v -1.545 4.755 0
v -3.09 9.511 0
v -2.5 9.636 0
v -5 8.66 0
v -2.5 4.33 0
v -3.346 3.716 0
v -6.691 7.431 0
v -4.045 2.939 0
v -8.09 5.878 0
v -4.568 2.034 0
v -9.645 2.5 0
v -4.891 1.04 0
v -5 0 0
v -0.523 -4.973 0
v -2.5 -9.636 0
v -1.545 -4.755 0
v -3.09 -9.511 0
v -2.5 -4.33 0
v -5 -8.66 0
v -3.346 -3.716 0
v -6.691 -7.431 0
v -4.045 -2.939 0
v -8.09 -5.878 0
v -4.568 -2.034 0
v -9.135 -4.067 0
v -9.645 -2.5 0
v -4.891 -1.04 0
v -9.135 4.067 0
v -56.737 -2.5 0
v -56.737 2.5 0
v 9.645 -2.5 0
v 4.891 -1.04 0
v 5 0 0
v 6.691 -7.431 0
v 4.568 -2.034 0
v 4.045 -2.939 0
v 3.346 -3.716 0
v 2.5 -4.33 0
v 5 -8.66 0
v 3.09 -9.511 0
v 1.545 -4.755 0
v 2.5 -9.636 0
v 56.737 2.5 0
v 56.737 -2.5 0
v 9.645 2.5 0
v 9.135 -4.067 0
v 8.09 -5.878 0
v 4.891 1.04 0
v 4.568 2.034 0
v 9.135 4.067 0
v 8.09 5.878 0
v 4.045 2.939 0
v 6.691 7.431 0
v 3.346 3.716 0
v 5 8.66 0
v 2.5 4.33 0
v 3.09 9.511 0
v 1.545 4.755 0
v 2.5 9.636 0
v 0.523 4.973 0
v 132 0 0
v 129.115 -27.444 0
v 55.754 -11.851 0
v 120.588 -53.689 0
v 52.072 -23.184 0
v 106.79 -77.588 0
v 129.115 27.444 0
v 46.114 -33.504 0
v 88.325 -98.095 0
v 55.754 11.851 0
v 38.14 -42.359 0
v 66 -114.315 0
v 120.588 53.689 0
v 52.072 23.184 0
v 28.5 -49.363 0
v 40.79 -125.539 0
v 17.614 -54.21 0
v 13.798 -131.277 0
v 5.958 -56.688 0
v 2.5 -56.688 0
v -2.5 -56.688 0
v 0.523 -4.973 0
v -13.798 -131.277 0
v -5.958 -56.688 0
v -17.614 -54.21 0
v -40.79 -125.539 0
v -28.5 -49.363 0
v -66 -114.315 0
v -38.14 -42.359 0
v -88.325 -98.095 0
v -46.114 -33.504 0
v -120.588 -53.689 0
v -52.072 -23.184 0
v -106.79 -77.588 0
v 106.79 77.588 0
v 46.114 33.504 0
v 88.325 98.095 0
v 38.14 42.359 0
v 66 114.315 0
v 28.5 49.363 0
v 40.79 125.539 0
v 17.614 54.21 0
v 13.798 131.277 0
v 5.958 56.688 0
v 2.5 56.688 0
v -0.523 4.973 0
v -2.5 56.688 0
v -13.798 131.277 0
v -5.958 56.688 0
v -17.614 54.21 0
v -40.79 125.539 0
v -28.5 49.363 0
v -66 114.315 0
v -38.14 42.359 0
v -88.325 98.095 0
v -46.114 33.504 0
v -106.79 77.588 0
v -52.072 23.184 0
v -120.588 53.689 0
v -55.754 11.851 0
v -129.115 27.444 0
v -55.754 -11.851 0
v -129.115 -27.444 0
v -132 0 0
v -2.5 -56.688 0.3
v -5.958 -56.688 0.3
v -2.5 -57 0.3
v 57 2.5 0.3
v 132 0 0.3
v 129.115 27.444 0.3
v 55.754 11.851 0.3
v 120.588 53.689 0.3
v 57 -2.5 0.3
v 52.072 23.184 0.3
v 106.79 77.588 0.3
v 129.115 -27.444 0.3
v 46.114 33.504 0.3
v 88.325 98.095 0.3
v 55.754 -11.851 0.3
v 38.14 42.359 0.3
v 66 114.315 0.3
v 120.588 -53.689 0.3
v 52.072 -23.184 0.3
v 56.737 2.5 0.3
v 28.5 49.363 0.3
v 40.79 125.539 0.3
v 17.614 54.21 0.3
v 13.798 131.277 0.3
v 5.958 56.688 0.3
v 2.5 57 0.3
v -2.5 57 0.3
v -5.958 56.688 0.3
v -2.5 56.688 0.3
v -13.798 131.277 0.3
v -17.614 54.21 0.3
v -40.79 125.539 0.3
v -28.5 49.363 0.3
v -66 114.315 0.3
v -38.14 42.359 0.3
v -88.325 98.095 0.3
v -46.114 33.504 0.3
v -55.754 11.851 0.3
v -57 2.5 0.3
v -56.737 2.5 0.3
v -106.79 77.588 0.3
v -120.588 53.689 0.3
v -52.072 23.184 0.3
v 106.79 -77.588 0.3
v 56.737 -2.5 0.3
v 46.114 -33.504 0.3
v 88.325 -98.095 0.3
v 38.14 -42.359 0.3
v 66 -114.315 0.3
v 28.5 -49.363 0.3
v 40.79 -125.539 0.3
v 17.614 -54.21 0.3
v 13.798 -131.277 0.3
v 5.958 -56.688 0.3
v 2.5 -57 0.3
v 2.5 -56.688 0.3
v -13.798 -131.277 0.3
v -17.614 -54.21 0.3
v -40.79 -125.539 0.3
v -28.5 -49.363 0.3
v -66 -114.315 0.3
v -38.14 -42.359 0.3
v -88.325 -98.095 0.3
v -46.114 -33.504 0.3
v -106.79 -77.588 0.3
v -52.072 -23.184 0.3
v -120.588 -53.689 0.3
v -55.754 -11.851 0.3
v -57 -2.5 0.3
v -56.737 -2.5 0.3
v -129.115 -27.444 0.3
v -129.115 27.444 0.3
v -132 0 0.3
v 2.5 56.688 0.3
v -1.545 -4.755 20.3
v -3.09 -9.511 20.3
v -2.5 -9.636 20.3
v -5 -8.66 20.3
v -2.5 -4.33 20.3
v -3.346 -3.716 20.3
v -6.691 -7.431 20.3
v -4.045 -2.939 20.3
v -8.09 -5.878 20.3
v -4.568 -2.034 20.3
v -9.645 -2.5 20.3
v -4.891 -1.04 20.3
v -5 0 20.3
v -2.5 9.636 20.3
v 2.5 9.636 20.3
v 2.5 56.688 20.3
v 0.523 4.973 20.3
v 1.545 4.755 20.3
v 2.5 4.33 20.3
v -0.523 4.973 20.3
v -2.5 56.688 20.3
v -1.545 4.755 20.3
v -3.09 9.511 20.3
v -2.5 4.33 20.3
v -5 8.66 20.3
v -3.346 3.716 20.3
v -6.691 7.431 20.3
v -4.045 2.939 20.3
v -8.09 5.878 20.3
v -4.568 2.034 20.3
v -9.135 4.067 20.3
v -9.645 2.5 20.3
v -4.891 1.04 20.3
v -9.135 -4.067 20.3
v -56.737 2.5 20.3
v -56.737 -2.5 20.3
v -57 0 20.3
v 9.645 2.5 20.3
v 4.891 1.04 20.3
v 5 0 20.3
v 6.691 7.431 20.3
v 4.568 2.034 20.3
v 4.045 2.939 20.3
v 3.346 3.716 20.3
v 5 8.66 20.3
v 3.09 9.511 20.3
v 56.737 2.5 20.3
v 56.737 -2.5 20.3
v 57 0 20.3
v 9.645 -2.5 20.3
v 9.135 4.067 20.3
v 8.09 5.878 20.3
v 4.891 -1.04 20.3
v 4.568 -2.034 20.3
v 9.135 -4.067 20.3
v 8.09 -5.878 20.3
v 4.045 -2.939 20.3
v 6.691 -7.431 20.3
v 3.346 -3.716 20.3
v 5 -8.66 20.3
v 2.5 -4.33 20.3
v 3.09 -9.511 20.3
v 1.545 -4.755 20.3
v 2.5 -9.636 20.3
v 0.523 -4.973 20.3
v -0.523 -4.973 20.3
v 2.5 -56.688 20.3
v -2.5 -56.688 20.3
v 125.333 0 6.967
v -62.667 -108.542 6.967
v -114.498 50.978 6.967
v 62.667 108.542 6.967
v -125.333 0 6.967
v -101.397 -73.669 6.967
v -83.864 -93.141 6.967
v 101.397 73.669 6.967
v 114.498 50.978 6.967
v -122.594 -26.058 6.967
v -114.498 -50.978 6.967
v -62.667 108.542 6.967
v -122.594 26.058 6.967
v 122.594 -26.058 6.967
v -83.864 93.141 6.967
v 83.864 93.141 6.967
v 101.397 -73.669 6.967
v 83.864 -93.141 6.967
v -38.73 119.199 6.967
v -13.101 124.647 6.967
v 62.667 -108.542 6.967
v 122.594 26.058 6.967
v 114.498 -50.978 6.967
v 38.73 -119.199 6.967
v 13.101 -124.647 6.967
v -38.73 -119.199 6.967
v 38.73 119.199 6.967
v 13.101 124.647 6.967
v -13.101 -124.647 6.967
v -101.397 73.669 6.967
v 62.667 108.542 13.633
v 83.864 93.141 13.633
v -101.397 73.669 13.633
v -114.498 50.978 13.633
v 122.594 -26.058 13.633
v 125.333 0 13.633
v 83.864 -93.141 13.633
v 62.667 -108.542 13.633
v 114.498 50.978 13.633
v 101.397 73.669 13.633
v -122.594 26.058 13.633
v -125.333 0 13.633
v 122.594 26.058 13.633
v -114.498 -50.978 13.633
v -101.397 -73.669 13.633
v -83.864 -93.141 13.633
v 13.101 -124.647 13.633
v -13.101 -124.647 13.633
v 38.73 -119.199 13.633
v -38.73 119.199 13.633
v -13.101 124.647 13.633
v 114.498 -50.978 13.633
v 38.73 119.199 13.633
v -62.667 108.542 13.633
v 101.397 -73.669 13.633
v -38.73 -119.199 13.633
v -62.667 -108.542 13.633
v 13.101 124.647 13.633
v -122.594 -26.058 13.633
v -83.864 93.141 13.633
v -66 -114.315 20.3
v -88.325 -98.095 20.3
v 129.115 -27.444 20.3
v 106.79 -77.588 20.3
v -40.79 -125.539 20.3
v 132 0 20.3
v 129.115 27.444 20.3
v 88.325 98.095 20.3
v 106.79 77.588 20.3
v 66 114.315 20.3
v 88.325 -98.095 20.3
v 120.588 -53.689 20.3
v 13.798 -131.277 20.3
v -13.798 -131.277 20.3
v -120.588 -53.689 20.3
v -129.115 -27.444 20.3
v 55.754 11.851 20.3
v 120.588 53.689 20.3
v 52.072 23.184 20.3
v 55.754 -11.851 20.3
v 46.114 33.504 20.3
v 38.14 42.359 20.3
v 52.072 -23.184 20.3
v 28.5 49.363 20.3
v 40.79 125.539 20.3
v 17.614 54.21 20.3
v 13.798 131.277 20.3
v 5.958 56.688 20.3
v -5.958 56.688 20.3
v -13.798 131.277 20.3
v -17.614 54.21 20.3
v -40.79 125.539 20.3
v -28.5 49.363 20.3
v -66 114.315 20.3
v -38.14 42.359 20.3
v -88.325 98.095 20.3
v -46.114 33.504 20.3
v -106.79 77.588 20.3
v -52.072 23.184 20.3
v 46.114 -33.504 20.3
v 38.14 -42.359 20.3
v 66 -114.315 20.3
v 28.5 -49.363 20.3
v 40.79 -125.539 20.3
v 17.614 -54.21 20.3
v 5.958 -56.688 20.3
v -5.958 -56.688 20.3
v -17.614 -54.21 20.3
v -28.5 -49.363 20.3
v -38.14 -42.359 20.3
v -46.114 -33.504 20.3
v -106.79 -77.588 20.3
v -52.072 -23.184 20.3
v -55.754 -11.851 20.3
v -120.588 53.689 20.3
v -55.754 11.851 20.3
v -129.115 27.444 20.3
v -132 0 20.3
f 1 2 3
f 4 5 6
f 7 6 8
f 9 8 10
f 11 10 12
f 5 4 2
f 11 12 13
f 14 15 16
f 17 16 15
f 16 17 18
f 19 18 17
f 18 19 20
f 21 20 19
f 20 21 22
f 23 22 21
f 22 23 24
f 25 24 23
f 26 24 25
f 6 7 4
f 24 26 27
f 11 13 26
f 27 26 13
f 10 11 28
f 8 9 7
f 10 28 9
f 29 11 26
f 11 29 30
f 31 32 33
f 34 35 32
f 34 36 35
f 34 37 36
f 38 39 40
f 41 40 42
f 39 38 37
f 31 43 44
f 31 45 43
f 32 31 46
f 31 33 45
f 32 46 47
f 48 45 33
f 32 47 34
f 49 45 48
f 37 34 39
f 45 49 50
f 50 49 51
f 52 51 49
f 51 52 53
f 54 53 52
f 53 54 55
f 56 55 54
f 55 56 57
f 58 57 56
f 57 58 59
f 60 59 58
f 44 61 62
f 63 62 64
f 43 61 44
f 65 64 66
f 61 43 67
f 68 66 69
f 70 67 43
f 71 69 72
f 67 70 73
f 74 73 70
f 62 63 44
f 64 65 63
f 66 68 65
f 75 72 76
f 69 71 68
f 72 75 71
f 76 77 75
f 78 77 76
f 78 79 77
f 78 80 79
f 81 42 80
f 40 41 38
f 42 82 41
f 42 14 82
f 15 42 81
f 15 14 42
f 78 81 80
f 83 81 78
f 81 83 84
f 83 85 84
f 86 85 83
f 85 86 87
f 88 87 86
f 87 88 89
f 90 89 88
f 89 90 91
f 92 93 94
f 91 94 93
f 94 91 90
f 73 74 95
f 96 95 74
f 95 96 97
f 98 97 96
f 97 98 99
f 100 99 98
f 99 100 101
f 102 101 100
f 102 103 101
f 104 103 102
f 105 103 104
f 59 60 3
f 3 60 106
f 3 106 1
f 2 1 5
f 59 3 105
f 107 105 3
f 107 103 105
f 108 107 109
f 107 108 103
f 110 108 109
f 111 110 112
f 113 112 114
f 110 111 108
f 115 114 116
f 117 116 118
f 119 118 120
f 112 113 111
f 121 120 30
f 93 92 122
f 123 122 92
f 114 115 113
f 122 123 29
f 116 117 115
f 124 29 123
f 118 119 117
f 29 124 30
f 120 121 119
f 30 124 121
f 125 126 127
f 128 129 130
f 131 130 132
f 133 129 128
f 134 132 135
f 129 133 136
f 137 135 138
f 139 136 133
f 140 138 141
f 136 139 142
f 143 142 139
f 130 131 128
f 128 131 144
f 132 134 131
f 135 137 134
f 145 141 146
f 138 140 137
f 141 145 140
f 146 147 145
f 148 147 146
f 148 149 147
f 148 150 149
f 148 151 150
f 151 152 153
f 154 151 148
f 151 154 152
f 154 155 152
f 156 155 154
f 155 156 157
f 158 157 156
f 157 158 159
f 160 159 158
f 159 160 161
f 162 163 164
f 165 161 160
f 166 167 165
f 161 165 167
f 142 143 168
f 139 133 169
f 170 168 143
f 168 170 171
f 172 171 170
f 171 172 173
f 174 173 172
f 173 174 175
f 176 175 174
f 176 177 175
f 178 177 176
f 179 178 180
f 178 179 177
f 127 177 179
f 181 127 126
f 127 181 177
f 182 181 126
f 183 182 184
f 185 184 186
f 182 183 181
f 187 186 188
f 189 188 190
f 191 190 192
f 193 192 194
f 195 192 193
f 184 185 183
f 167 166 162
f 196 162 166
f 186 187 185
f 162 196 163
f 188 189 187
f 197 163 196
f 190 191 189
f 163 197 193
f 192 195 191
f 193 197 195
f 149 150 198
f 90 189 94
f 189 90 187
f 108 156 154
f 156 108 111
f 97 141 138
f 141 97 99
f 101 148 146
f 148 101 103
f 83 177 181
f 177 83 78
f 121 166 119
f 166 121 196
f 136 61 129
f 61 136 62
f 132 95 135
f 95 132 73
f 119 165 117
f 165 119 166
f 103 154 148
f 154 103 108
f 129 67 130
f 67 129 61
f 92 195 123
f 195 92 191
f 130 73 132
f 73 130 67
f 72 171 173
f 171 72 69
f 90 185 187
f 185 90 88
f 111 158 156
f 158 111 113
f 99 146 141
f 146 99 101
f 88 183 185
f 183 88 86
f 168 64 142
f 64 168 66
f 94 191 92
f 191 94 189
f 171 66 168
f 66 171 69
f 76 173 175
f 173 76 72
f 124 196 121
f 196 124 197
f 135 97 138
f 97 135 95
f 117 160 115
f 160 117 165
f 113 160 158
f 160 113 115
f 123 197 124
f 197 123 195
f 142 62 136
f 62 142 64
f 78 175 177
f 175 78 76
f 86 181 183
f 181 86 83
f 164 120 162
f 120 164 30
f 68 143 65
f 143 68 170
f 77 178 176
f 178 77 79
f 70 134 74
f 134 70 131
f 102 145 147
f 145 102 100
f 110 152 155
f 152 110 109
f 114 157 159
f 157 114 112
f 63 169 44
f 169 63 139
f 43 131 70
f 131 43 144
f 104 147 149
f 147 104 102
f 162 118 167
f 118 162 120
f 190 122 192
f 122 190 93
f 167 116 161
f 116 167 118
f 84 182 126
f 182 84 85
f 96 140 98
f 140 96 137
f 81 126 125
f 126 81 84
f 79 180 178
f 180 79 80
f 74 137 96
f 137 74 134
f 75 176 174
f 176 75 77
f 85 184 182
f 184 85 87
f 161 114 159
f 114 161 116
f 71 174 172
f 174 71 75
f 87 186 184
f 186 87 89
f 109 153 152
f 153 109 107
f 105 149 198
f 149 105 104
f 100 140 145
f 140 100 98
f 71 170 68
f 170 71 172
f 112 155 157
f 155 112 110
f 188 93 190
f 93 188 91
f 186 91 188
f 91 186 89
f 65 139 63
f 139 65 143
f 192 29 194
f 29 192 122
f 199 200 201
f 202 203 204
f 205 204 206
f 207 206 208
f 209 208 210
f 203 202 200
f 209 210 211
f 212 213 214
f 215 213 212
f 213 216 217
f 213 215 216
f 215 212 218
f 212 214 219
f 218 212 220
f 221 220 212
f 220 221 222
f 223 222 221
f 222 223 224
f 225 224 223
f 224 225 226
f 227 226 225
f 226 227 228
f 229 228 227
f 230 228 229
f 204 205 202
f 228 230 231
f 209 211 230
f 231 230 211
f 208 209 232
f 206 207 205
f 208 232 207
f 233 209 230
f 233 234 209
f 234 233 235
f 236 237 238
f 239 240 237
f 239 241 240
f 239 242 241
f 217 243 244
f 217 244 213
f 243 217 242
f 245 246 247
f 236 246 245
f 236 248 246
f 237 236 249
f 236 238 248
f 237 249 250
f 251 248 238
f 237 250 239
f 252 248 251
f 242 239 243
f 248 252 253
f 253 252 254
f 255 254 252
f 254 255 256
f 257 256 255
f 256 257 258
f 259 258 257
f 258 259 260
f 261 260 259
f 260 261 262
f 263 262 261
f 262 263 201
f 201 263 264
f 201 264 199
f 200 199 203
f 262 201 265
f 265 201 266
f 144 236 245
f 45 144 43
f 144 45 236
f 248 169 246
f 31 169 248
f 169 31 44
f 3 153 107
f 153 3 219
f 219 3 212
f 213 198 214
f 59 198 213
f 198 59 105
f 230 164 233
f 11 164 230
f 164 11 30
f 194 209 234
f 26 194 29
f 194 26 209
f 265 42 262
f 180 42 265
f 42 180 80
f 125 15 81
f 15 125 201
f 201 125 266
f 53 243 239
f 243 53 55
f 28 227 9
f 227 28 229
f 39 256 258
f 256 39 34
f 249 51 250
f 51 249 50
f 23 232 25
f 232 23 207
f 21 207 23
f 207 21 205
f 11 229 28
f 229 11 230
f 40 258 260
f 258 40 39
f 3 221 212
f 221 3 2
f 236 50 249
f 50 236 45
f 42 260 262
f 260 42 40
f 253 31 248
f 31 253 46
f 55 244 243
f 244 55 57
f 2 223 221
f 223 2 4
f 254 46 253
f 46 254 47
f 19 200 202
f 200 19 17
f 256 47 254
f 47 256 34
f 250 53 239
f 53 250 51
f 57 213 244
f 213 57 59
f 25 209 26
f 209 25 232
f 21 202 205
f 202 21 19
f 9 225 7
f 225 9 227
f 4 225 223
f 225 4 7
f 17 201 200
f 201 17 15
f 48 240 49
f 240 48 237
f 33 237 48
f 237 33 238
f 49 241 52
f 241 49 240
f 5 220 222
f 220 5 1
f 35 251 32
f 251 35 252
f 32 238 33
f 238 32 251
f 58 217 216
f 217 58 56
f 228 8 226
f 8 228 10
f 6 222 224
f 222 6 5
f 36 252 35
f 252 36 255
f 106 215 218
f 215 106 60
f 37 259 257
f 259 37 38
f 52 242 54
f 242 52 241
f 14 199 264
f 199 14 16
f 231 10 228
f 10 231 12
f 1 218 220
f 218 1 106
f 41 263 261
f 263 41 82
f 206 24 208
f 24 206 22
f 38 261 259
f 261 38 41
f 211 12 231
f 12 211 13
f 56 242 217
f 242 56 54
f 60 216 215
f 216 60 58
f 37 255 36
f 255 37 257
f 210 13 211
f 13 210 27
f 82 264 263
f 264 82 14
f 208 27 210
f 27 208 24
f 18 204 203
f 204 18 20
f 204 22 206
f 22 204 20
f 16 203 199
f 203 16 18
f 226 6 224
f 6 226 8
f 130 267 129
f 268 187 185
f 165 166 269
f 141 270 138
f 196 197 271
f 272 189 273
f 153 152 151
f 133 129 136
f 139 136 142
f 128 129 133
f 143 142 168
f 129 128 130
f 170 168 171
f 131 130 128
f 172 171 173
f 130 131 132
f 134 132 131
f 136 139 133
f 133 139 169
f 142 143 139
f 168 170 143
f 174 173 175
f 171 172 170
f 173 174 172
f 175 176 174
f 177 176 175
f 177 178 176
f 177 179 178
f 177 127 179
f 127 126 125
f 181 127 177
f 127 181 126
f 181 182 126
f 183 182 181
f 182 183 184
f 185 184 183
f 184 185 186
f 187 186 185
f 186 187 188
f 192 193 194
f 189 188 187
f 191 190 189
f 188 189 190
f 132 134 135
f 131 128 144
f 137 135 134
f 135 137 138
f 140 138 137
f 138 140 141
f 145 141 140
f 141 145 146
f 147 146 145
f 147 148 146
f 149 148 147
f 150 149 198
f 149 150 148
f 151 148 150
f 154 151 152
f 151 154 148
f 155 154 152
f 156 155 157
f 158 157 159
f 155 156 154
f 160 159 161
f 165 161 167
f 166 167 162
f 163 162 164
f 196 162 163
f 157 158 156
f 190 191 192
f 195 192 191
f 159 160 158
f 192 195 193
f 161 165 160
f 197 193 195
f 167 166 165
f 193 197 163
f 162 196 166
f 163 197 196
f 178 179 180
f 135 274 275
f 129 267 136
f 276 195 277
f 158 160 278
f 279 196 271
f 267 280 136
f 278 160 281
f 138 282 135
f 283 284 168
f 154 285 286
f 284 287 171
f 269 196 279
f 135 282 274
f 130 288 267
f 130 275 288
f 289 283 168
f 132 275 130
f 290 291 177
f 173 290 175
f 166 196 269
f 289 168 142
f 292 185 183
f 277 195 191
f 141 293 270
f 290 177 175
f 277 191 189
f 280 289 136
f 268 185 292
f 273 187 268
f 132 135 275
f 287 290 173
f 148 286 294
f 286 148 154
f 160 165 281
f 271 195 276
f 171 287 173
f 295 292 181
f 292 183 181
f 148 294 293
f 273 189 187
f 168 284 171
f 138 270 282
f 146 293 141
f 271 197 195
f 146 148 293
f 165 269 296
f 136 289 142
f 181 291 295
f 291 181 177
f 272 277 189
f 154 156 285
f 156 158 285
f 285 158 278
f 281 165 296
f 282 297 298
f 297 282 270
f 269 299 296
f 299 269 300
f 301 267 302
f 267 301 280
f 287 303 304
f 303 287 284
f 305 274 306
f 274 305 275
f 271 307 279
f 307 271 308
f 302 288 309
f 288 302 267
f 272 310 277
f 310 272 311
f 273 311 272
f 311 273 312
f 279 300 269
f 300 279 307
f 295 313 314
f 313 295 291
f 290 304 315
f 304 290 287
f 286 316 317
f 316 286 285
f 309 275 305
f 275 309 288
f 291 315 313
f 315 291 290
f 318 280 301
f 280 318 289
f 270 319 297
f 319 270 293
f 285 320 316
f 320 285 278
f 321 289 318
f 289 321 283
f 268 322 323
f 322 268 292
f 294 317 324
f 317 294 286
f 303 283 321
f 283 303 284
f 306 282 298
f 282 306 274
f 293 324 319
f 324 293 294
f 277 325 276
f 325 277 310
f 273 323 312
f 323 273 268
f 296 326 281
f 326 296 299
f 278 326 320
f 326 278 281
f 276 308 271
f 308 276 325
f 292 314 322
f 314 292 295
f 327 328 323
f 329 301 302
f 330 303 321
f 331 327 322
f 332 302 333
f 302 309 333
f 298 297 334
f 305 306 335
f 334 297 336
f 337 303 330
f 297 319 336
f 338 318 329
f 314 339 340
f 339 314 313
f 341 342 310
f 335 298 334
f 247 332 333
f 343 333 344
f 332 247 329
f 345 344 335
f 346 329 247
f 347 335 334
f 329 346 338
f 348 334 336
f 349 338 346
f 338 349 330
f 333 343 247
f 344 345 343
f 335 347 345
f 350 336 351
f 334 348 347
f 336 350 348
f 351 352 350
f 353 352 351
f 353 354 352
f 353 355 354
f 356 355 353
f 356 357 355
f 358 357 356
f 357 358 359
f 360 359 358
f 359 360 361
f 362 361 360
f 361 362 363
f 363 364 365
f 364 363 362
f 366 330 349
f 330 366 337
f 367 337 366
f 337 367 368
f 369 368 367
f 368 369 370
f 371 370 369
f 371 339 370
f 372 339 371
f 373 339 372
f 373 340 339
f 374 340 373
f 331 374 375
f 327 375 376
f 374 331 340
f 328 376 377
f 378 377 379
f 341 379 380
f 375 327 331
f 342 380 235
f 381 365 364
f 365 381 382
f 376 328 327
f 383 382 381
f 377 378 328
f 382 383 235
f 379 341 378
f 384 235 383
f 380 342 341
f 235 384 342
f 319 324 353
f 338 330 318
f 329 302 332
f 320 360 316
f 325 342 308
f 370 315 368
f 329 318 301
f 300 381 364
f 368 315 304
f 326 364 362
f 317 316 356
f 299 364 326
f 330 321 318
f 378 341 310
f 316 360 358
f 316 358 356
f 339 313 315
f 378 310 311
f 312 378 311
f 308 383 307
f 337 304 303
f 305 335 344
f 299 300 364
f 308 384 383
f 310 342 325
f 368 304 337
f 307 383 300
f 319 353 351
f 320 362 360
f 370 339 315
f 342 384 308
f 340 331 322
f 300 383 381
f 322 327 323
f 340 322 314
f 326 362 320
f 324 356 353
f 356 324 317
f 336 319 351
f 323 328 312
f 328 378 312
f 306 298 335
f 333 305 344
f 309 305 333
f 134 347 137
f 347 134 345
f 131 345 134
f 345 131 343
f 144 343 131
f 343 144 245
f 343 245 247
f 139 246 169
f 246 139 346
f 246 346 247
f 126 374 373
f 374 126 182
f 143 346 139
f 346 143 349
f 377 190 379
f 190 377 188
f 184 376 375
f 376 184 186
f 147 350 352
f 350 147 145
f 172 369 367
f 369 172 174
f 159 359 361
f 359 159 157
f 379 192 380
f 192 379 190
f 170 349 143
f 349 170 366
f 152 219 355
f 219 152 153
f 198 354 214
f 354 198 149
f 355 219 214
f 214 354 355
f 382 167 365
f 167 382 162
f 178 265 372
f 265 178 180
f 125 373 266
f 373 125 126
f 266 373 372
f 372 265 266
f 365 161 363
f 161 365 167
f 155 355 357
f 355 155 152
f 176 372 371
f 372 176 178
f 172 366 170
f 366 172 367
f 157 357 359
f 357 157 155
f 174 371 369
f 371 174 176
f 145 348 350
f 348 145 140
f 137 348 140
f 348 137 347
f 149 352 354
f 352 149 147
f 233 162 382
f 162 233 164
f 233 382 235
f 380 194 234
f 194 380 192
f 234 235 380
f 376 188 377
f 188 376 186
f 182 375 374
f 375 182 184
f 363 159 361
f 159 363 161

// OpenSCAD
/* 
This is an OpenSCAD library to create various pinion wheels, escapements and other pieces of clockwork gearing
Uses the MCAD involute_gears library and will not work without it!
Created by syvwlch and licensed under the Attribution - Share Alike - Creative Commons license.

v1 - 2011 04 15	
First library version of the code

v2 - 2011 04 21	
Added spokes() module, and used it in escapement() module
Updated escapement(), ringtooth(), tooth() and ring() modules to render better in openCSG mode

v3 - 2011 04 22
Renamed to clockworkLibrary
Added hand(), handNotch(), pinionWheel(), pinionEscapementWheel(), pinionDrum()

v4 - 2011 04 29
Added negative space toggle to the parts, with a default value of false

v5 - 2011 05 01
Added herringbone gear option, with a default value of 0
Strengthened pinion teeth.

v6 - 2011 05 04 
Changed how drum height in pinionDrum() is measured to work like sleeve extension does, to simplify placement math
Corrected error in how sleeve extension is measured in pinionWheel() (wheels are 2*thickness+1*spacer thick)
Changed how drum height in pinionEscapementWheel() is measured, to standardize
Create a drum() module, and implemeted flanges to keep the string from falling off
Retrofitted drum() into pinionDrum(), as well as for the spacer in pinionEscapementWheel() and pinionWheel()

v7 - 2011 05 04 
Added an assymetric spacer so that the herringbone gears would mesh without running into the drum flanges
Switched to using mirror() to implement the two halves of the herringbone as a result

v8 - 2011 05 06
Fixed a bug in spokes() which referenced the wrong spoke width parameter (thanks kitlaan!)

v9 - 2011 05 07
Modified the escapement wheel profile to support club teeth (still defaults to ratchet teeth)
Club tooth parameters accessible in tooth(), ringtooth(), escapementWheel() and pinionEscapementWheel()
Modified escapement to control angle of impulse faces on the pallets, defaults to 45o as per ideal Graham escapement w/o club teeth
Escapement will work if impulse face angles are set to 45o minus tooth lean plus club angle, and drop can be controlled via face angle

v10 - 2011 05 08
Modified the drum() module to add holes to attach a string
Backwards compatible with no holes if the new arguments are not passed
Modified pinionDrum() to make use of this new feature, but backwards compatible with no holes if the new arguments are not passed

v11 - 2011 05 18
Modified to support the ratcheting drum designed by rustedrobot: http://www.thingiverse.com/thing:8555
Backwards compatible, one-piece drum still available as an option

v12 - 2012 02 06
Modified after Clockathon #1 and #2
PinionDrum deprecated, invoke pinionWheel instead, with number of teeth for the pinion gear set to zero.


It includes the following modules:
 
module ring(outerRadius,innerRadius,thickness,outerSegment=30,innerSegment=30)
	creates a hollow cylinder centered at origin
		outerRadius and innerRadius should be self-explanatory
		thickess is along z
		outerSegment is an optional override of the system variable $fn
		innerSegment is an optional override of the system variable $fn

module spokes(number_spokes,spoke_length,spoke_thickness,spoke_width,bore_radius,spoke_rotate=0) 
	creates spokes for a ring
		number_spokes controls the number of spokes
		spoke_length controls the length of the spokes, measured radialy from the center
		spoke_thickness controls the thickness of the spokes, measured along z
		spoke_width controls the width of the spokes, at right angles to length and thickness
		bore_radius controls the radius of the hole at the center
		spoke_rotate allows to rotate the whole set of spokes by some value

module tooth(toothLength,thickness,toothLean,toothSharpness)
	creates a triangular tooth, sharp end at origin
		toothLength is measured along longest side
		thickess is along z
		toothLean measures how far the tooth leans over, in degrees
		toothSharpness measures how sharp the tooth is, in degrees

module ringTooth(outerRadius,innerRadius,thickness,numberTeeth,toothLength)
	creates a ring centered at origin with the child spaced regularly along the outside edge of the inner radius
		outerRadius and innerRadius should be self-explanatory
		thickess is along z 
		numberTeeth controls how many instances of the child are used
		toothlength is used to offset the teeth outward, if needed

module escapementWheel(radius,rimWidth,drumHeight,toothThickness,numberTeeth,toothLength,toothLean,toothSharpness,numberSpokes,spokeWidth,hubWidth,bore)
	creates an escapement wheel centered at origin that matches the escapement if the parameter values are the same
	the teeth can be given a smaller thickness than the wheel, creating a drum, e.g. for powering the escapement via a weight on a string
		radius is the outer radius measured from the tooth tips
		rimWidth is the width of the rim of the wheel, measured radially
		drumHeight is the height of the drum along z
		toothThickess is the thickness of the teeth along z
		numberTeeth controls how many teeth the wheel has
		toothLength is the length of each tooth, 
		toothLean measures how far the tooth leans over clockwise, in degrees
		toothSharpness measures how sharp the tooth is, in degrees
		numberSpokes controls the number of spokes of the wheel
		spokeWidth controls the width of the spokes of the wheel
		hubWidth controls the width of the hub
		bore controls the size of the bore in the hub

module escapement(radius,thickness,faceAngle,armAngle,armWidth,numberTeeth,toothSpan,hubWidth,hubHeight,bore)
	creates a Graham escapement that matches the escapement wheel if the parameter values are the same 
	the escapement is centered at the origin and mirrored around the y axis
	for proper meshing, it must be translated by 2*radius*cos(180/numberTeeth*toothSpan) along the y axis
		radius is the radius of the wheel, not of the escapement
		thickess is along z
		faceAngle controls how many degrees the impulse face covers seen from the hub of the escapement wheel
		armAngle controls the angle of the escapement's arms, 0= no bend
		armWidth controls the width of the arms
		numberTeeth is the number of teeth of the wheel
		toothSpan is how many teeth the escapement spans 
		hubWidth controls the width of the hub
		hubHeight controls the height of the hub along z
		bore controls the size of the bore in the hub

module placeEscapement (angle,radius,numberTeeth,toothSpan)
	places the child (e.g. an instance of the escapement module) in a position to mesh properly with a matching wheel at origin
	also rotates the escapement around the wheel, if needed
		angle is the angle the escapement is rotated around the wheel
		radius is the radius of the escapement wheel (from the tooth tips)
		numberTeeth is the number of teeth in the wheel
		toothSpan is the number of teeth the escapement spans

module hand(hand_length,hand_width,hand_thickness,sleeve_level,pin_radius,sleeve_thickness,loose_fit,tight_fit,negative_space=false) 

module handNotch(notch_height,notch_width,sleeve_level,pin_radius,sleeve_thickness,notch_angle=0,negative_space=false)

module pinionWheel (large_gear_teeth,large_gear_circular_pitch,small_gear_teeth,small_gear_circular_pitch,gear_clearance,gear_backlash,pressure_angle,rim_width,sleeve_level,pin_radius,sleeve_thickness,loose_fit,gear_thickness,sleeve_extension,spacer,spoke_width,notch_angle=0,negative_space=false)

module pinionEscapementWheel (radius,escapement_teeth,tooth_length,tooth_lean,tooth_sharpness,small_gear_teeth,small_gear_circular_pitch,gear_clearance,gear_backlash,pressure_angle,rim_width,sleeve_level,pin_radius,sleeve_thickness,loose_fit,gear_thickness,sleeve_extension,spacer,spoke_width,notch_angle=0,negative_space=false)

module pinionDrum (drum_height,number_spokes,large_gear_teeth,large_gear_circular_pitch,gear_clearance,gear_backlash,pressure_angle,rim_width,sleeve_level,pin_radius,sleeve_thickness,loose_fit,gear_thickness,sleeve_extension,spacer,spoke_width,notch_angle=0,negative_space=false)

*/

/* test 

*/

escapementWheel(
	radius=66,
	rimWidth=75,
	drumHeight=20,
	toothThickness=.3,
	numberTeeth=30,
	toothLength=9,
	toothLean=30,
	toothSharpness=5,
	numberSpokes=4,
	spokeWidth=5,
	hubWidth=10,
	bore=5,
	clubSize=.2,
	clubAngle=30);

// End test 

module ring(
	outerRadius,
	innerRadius,
	thickness,
	outerSegment=30,
	innerSegment=30)
{
	difference() // hollows out the center of one cylinder with another, smaller one
	{
		cylinder(thickness,outerRadius,outerRadius,$fn=outerSegment);
		translate([0,0,-1])
		cylinder(thickness+2,innerRadius,innerRadius,,$fn=innerSegment);
	}
}

module spokes(
	number_spokes,
	spoke_length,
	spoke_thickness,
	spoke_width,
	bore_radius,
	spoke_rotate=0) 
{
	for ( j=[0:number_spokes-1]) // adds the spokes
	{
		rotate(spoke_rotate+360/number_spokes*j,[0,0,1]) 
		translate([bore_radius,-spoke_width/2,0]) 
		cube([spoke_length-bore_radius,spoke_width,spoke_thickness]);
	}
}

module tooth(
	toothLength,
	thickness,
	toothLean,
	toothSharpness,
	clubSize=0,
	clubAngle=0)
{
	rotate(-toothLean,[0,0,1])
	rotate(180,[0,0,1])
	linear_extrude(height=thickness,center=false,twist=0)
	polygon(
		points=	[ 	
				[0,0],
				[clubSize*toothLength*cos(45+toothLean+clubAngle),-clubSize*toothLength*sin(45+toothLean+clubAngle)],
				[clubSize*toothLength*(0.2+cos(45+toothLean+clubAngle)),-clubSize*toothLength*sin(45+toothLean+clubAngle)],
				[clubSize*toothLength*0.5,-clubSize*toothLength*0.5],
				[toothLength,0],
				[toothLength*cos(toothSharpness),toothLength*sin(toothSharpness)]
				],
		paths=	[
				[0,1,2,3,4,5]
				] );
}

module ringTooth(
	outerRadius,
	innerRadius,
	thickness,
	numberTeeth,
	toothLength)
{
	difference() // makes the center hollow while shaving off any parts of the teeth which might otherwise extend into the center
	 {
		union() // unites the teeth and the ring
		{
			cylinder(thickness,outerRadius,outerRadius,$fn=30);
			for ( i=[0:numberTeeth])
			{
				rotate(i*360/numberTeeth,[0,0,1])
				translate([innerRadius+toothLength,0,0]) 
				children(0);
			}
		}

		translate([0,0,-1])
		cylinder(thickness+2,innerRadius,innerRadius,$fn=30);
	}
}

module drum(
	radius,
	rimWidth,
	drumHeight,
	numberHoles=0,
	holeRadius=0,
	holeRotate=0)
{
	flangeWidth=min(drumHeight/3,rimWidth/2);

	difference()		// makes the center hollow & includes holes to attach string
	 {
		union() 	// builds the drum with flanges
		{
			cylinder(flangeWidth,radius,radius-flangeWidth,$fn=30);
	
			translate([0,0,flangeWidth])
			cylinder(drumHeight-2*flangeWidth,radius-flangeWidth,radius-flangeWidth);
	
			translate([0,0,drumHeight-flangeWidth])
			cylinder(flangeWidth,radius-flangeWidth,radius,$fn=30);
		}

		translate([0,0,-1])
		cylinder(drumHeight+2,radius-rimWidth,radius-rimWidth,$fn=30);

        if( numberHoles > 0 ) 
        {
            for ( j=[0:numberHoles-1]) // adds the holes
            {
                translate([0,0,drumHeight/2])
                rotate(holeRotate+360/numberHoles*j,[0,0,1]) 
                rotate(90,[0,1,0])
                cylinder(r=holeRadius,h=radius+1);
            }

        }
    }
}

module escapementWheel(
	radius,
	rimWidth,
	drumHeight,
	toothThickness,
	numberTeeth,
	toothLength,
	toothLean,
	toothSharpness,
	numberSpokes,
	spokeWidth,
	hubWidth,
	bore,
	clubSize=0,
	clubAngle=0)
{
	flangeWidth=min(drumHeight/3,rimWidth/2);

	union() // unites the wheel, the spokes and the hub
		{
		ringTooth(radius-toothLength+rimWidth,radius-toothLength,toothThickness,numberTeeth,toothLength)
		tooth(toothLength,toothThickness,toothLean,toothSharpness,clubSize,clubAngle);

		spokes(numberSpokes,radius-toothLength,drumHeight+toothThickness,spokeWidth,bore,0);

		ring(hubWidth,bore,toothThickness+drumHeight);

		ring(radius-toothLength+rimWidth,radius-toothLength,toothThickness);

		translate([0,0,toothThickness])
		drum(radius-toothLength+rimWidth,rimWidth,drumHeight);
	}
}

module escapement(
	radius,
	thickness,
	faceAngle,
	armAngle,
	armWidth,
	numberTeeth,
	toothSpan,
	hubWidth,
	hubHeight,
	bore,
	negative_space=false,
	space=0.1,
	max_swing=6,
	entryPalletAngle=45,
	exitPalletAngle=45)
{
	faceWidth=2*3.1415*radius*faceAngle/360; // calculate once
	escapementAngle=180/numberTeeth*toothSpan; // calculate once
	
	rotate(90,[0,0,1]) // rotates escapement so pendulum is along y axis
	
	if (negative_space==false)
	{
		union()
		{
			// this is the hub
			ring(hubWidth,bore,hubHeight);
			
			// this is the exit pallet

		// this is the arm of the pallet
			rotate(-90-armAngle,[0,0,1]) 
			translate([bore,-armWidth/2,0]) 
			cube([radius+faceWidth/2-bore,armWidth,thickness]);
			
			// this is the pallet itself
			intersection()
			{
				// this is the ring from which the "dead" faces are made
				// it is important that the arcs be smooth, i.e. $fn high
				// otherwise, there would be some recoil
				ring(radius+faceWidth/2,radius-faceWidth/2,thickness,180,180);
				
				// this is the cube which cuts the pallet where it meets the arm
				rotate(-90-armAngle,[0,0,1])
				translate([radius,0,0])
				rotate(180,[0,0,1]) 
				translate([-0.5*radius,0,-radius])
				cube(2.1*radius);
				
				// this is the cube which cuts the pallet at the impulse face
				translate([-2*radius*cos(escapementAngle),0,0])
				rotate(-escapementAngle,[0,0,1])
				rotate(0,[0,0,1])
				translate([radius,0,0])
				rotate(-90-exitPalletAngle,[0,0,1]) 
				translate([-0.5*radius,0,-radius])
				cube(2.2*radius);
			}

		// this is the entry  pallet

			// this is the arm of the pallet
			rotate(90+armAngle,[0,0,1]) 
			translate([bore,-armWidth/2,0]) 
			cube([radius+faceWidth/2-bore,armWidth,thickness]);
			
			// this is the pallet itself
			intersection()
			{
				// this is the ring from which the "dead" faces are made
				// it is important that the arcs be smooth, i.e. $fn high
				// otherwise, there would be some recoil
				ring(radius+faceWidth/2,radius-faceWidth/2,thickness,180,180);
				
				// this is the cube which cuts the pallet where it meets the arm
				rotate(90+armAngle,[0,0,1])
				translate([radius,0,0])
				rotate(0,[0,0,1]) 
				translate([-0.5*radius,0,-radius])
				cube(2.1*radius);
				
				// this is the cube which cuts the pallet at the impulse face
				translate([-2*radius*cos(escapementAngle),0,0])
				rotate(-escapementAngle,[0,0,1])
				rotate(2*escapementAngle,[0,0,1])
				translate([radius,0,0])
				rotate(-90-entryPalletAngle,[0,0,1]) 
				translate([-0.5*radius,0,-radius])
				cube(2.2*radius);
			}
		}
	}

	if (negative_space==true)
	{
		translate([0,0,-space])
		union()
		{
			ring(hubWidth+space,0,hubHeight+2*space);

			difference()
			{
				ring(radius+faceWidth/2+space,0,thickness+2*space);

				rotate(max_swing-armAngle,[0,0,1])
				translate([-radius,armWidth/2,-1])
				cube(2*radius+faceWidth+2*space);

				mirror([1,0,0])
				rotate(max_swing-armAngle,[0,0,1])
				translate([-radius,armWidth/2,-1])
				cube(2*radius+faceWidth+2*space);
			}
		}
	}
}

module placeEscapement (
	angle,
	radius,
	numberTeeth,
	toothSpan)
{
	rotate(angle,[0,0,1])
	translate([0,2*radius*cos(180/numberTeeth*toothSpan),0])
	children(0);
}

module hand(
	hand_length,
	hand_width,
	hand_thickness,
	sleeve_level,
	pin_radius,
	sleeve_thickness,
	loose_fit,
	tight_fit,
	negative_space=false,
	space=0.1) 
{
	bore_radius=pin_radius+sleeve_level*sleeve_thickness;
	sleeve_radius=pin_radius+(sleeve_level+1)*sleeve_thickness;
	
	if (negative_space==false)
	{
		union()
		{
			intersection()
			{
				for ( i=[1:2])
				{
					rotate(i*360/3,[0,0,1])
					translate([bore_radius+loose_fit,-hand_width/2,0])
					cube([sleeve_radius-bore_radius-loose_fit+sleeve_thickness,hand_width,hand_thickness]);
				}
				
				translate(-1,[0,0,1])
				cylinder(hand_thickness+2,sleeve_radius+sleeve_thickness,sleeve_radius+sleeve_thickness);
			}
			
			translate([bore_radius+loose_fit,-hand_width/2,0])
			cube([hand_length-bore_radius-loose_fit,hand_width,hand_thickness]);

			ring(sleeve_radius+sleeve_thickness,bore_radius+tight_fit+sleeve_thickness,hand_thickness);
		}
	}

	if (negative_space==true)
	{
		translate([0,0,-space])
		ring(sqrt(hand_length*hand_length+hand_width*hand_width)+space,0,hand_thickness+2*space);
	}
}

module handNotch(
	notch_height,
	notch_width,
	sleeve_level,
	pin_radius,
	sleeve_thickness,
	notch_angle=0,
	negative_space=false) 
{
	//bore_radius=pin_radius+sleeve_level*sleeve_thickness;
	sleeve_radius=pin_radius+(sleeve_level+1)*sleeve_thickness;
	
	if (negative_space==false)
	{
		if (notch_width!=0)
		{
			difference()
			{
				children(0);
				
				for ( i=[0:2])
				{
					rotate(notch_angle+i*360/3,[0,0,1])
					translate([0,-notch_width/2,notch_height])
					cube([sleeve_radius+1,notch_width,notch_height+1]);
				}
			}
		}

		if (notch_width==0)
		{
			children(0);
		}
	}

	if (negative_space==true)
	{
		children(0);
	}
}

module pinionWheel(
	large_gear_teeth,
	large_gear_circular_pitch,
	small_gear_teeth=0,
	small_gear_circular_pitch=0,
	gear_clearance=0.2,
	gear_backlash=0.1,
	gear_spacer=0.5,
	pressure_angle=14.5,
	twist_factor=0,
	rim_width,
	sleeve_level=0,
	pin_radius,
	sleeve_thickness,
	loose_fit=0.5,
	gear_thickness,
	sleeve_extension,
	spacer,
	number_spokes=5,
	spoke_width,
	notch_angle=0,
	negative_space=false,
	space=0.1) 
{
	large_dedendum_radius=large_gear_circular_pitch*(large_gear_teeth-2)/360-gear_clearance;
	small_dedendum_radius=small_gear_circular_pitch*(small_gear_teeth-2)/360-gear_clearance;
	
	large_addendum_radius=large_gear_circular_pitch*(large_gear_teeth+2)/360-gear_clearance;
	small_addendum_radius=small_gear_circular_pitch*(small_gear_teeth+2)/360-gear_clearance;
	
	bore_radius=pin_radius+sleeve_level*sleeve_thickness+loose_fit;
	sleeve_radius=pin_radius+(sleeve_level+1)*sleeve_thickness;

	small_gear_color = [0.88, 0.78, 0.5];
	structure_color = [0.45, 0.43, 0.5];
	large_gear_color = [0.2, 0.2, 0.2];
	
	if (negative_space==false)
	{
		union()
		{
			color(large_gear_color)
			translate([0,0,gear_thickness/2])
			gear (circular_pitch=large_gear_circular_pitch, 
				gear_thickness = 0, 
				rim_thickness = gear_thickness/2-gear_spacer,
				rim_width = rim_width,
				hub_thickness = gear_thickness/2-gear_spacer, 
				hub_diameter=large_dedendum_radius*2,
				bore_diameter=(large_dedendum_radius-rim_width)*2, 
				circles=0,
				pressure_angle=pressure_angle,
				number_of_teeth=large_gear_teeth,
				clearance=gear_clearance,
				backlash=gear_backlash,
				twist=twist_factor*180/large_gear_teeth);

			color(large_gear_color)
			translate([0,0,gear_thickness/2])
			mirror([0,0,1])
			gear (circular_pitch=large_gear_circular_pitch, 
				gear_thickness = 0, 
				rim_thickness = gear_thickness/2,
				rim_width = rim_width,
				hub_thickness = gear_thickness/2, 
				hub_diameter=large_dedendum_radius*2,
				bore_diameter=(large_dedendum_radius-rim_width)*2, 
				circles=0,
				pressure_angle=pressure_angle,
				number_of_teeth=large_gear_teeth,
				clearance=gear_clearance,
				backlash=gear_backlash,
				twist=twist_factor*180/large_gear_teeth);

			color(structure_color)
			translate([0,0,gear_thickness-gear_spacer])
			drum(
				radius=large_dedendum_radius,
				rimWidth=rim_width,
				drumHeight=spacer,
				numberHoles=number_spokes,
				holeRadius=min(1,(spacer+gear_spacer)/6),
				holeRotate=180/number_spokes);

			color(structure_color)
			ring(sleeve_radius,bore_radius,2*gear_thickness+spacer+sleeve_extension);

			color(structure_color)
			spokes(number_spokes,large_dedendum_radius-rim_width,gear_thickness-gear_spacer+spacer,spoke_width,bore_radius,0);

			if (small_gear_teeth!=0)
			{
				color(structure_color)
				ring(small_addendum_radius,bore_radius,gear_thickness-gear_spacer+spacer);

				color(small_gear_color)
				translate([0,0,gear_thickness*1.5+spacer])
				gear (circular_pitch=small_gear_circular_pitch, 
					gear_thickness = 0, 
					rim_thickness = gear_thickness/2,
					rim_width = rim_width,
					hub_thickness = gear_thickness/2, 
					hub_diameter=small_dedendum_radius*2,
					bore_diameter=bore_radius*2,  
					circles=0,
					pressure_angle=pressure_angle,
					number_of_teeth=small_gear_teeth,
					clearance=gear_clearance,
					backlash=gear_backlash,
					twist=-twist_factor*180/small_gear_teeth);

				color(small_gear_color)
				translate([0,0,gear_thickness*1.5+spacer])
				mirror([0,0,1])
				gear (circular_pitch=small_gear_circular_pitch, 
					gear_thickness = 0, 
					rim_thickness = gear_thickness/2+gear_spacer,
					rim_width = rim_width,
					hub_thickness = gear_thickness/2+gear_spacer, 
					hub_diameter=small_dedendum_radius*2,
					bore_diameter=bore_radius*2,  
					circles=0,
					pressure_angle=pressure_angle,
					number_of_teeth=small_gear_teeth,
					clearance=gear_clearance,
					backlash=gear_backlash,
					twist=-twist_factor*180/small_gear_teeth);
			}
		}
	}

	if (negative_space==true)
	{
		color(structure_color)
		translate([0,0,-space])
		union()
		{
			ring(large_addendum_radius+space,0,gear_thickness+2*space);

			ring(small_addendum_radius+space,0,2*gear_thickness+spacer+2*space);

			ring(sleeve_radius+space,0,2*gear_thickness+spacer+sleeve_extension+2*space);
		}
	}
}

module pinionEscapementWheel (
	radius,
	escapement_teeth,
	tooth_length,
	tooth_lean,
	tooth_sharpness,
	small_gear_teeth,
	small_gear_circular_pitch,
	gear_clearance=0.2,
	gear_backlash=0.1,
	gear_spacer=0.5,
	pressure_angle=14.5,
	twist_factor=0,
	rim_width,
	sleeve_level=0,
	pin_radius,
	sleeve_thickness,
	loose_fit=0.5,
	gear_thickness,
	sleeve_extension,
	spacer,
	number_spokes=5,
	spoke_width,
	notch_angle=0,
	negative_space=false,
	space=0.1,
	clubSize=0,
	clubAngle=0)
{
	//large_dedendum_radius=large_gear_circular_pitch*(large_gear_teeth-2)/360-gear_clearance;
	small_dedendum_radius=small_gear_circular_pitch*(small_gear_teeth-2)/360-gear_clearance;

	//large_adddendum_radius=large_gear_circular_pitch*(large_gear_teeth+2)/360-gear_clearance;
	small_addendum_radius=small_gear_circular_pitch*(small_gear_teeth+2)/360-gear_clearance;

	bore_radius=pin_radius+sleeve_level*sleeve_thickness+loose_fit;
	sleeve_radius=pin_radius+(sleeve_level+1)*sleeve_thickness;

	small_gear_color = [0.88, 0.78, 0.5];
	structure_color = [0.45, 0.43, 0.5];
	//large_gear_color = [0.2, 0.2, 0.2];

	if (negative_space==false)
	{
		union()
		{
			color(structure_color)
			escapementWheel(
				radius,
				rim_width,
				0,
				gear_thickness-gear_spacer,
				escapement_teeth,
				tooth_length,
				tooth_lean,
				tooth_sharpness,
				number_spokes,
				spoke_width,
				small_addendum_radius,
				bore_radius,
				clubSize,
				clubAngle);

			color(structure_color)
			translate([0,0,gear_thickness-gear_spacer])
			drum(
				radius=radius-tooth_length+rim_width,
				rimWidth=rim_width,
				drumHeight=spacer,
				numberHoles=number_spokes,
				holeRadius=min(1,(spacer+gear_spacer)/6),
				holeRotate=180/number_spokes);

			color(structure_color)
			ring(sleeve_radius,bore_radius,2*gear_thickness+spacer+sleeve_extension);

			color(structure_color)
			spokes(number_spokes,radius-tooth_length,gear_thickness-gear_spacer+spacer,spoke_width,bore_radius,0);

			color(structure_color)
			ring(small_addendum_radius,bore_radius,gear_thickness-gear_spacer+spacer);

			color(small_gear_color)
			translate([0,0,gear_thickness*1.5+spacer])
			gear (circular_pitch=small_gear_circular_pitch, 
				gear_thickness = 0, 
				rim_thickness = gear_thickness/2,
				rim_width = rim_width,
				hub_thickness = gear_thickness/2, 
				hub_diameter=small_dedendum_radius*2,
				bore_diameter=bore_radius*2,  
				circles=0,
				pressure_angle=pressure_angle,
				number_of_teeth=small_gear_teeth,
				clearance=gear_clearance,
				backlash=gear_backlash,
				twist=-twist_factor*180/small_gear_teeth);

			color(small_gear_color)
			translate([0,0,gear_thickness*1.5+spacer])
			mirror([0,0,1])
			gear (circular_pitch=small_gear_circular_pitch, 
				gear_thickness = 0, 
				rim_thickness = gear_thickness/2+gear_spacer,
				rim_width = rim_width,
				hub_thickness = gear_thickness/2+gear_spacer, 
				hub_diameter=small_dedendum_radius*2,
				bore_diameter=bore_radius*2,  
				circles=0,
				pressure_angle=pressure_angle,
				number_of_teeth=small_gear_teeth,
				clearance=gear_clearance,
				backlash=gear_backlash,
				twist=-twist_factor*180/small_gear_teeth);
		}
	}

	if (negative_space==true)
	{
		color(structure_color)
		translate([0,0,-space])
		union()
		{
			ring(radius+space,0,gear_thickness+2*space);

			ring(small_addendum_radius+space,0,2*gear_thickness+spacer+2*space);

			ring(sleeve_radius+space,0,2*gear_thickness+spacer+sleeve_extension+2*space);
		}
	}

}

module pinionDrum (	//deprecated, use pinionWheel instead, with number of pinion teeth set to zero!
	drum_height,
	large_gear_teeth,
	large_gear_circular_pitch,
	gear_clearance=0.2,
	gear_backlash=0.1,
	gear_spacer=0.5,
	pressure_angle=14.5,
	twist_factor=0,
	rim_width,
	sleeve_level=0,
	pin_radius,
	sleeve_thickness,
	loose_fit=0.5,
	gear_thickness,
	sleeve_extension,
	spacer,
	number_spokes,
	spoke_width,
	number_holes=0,
	hole_radius=0,
	notch_angle=0,
	negative_space=false,
	space=0.1) 
{
	echo("pinionDrum is depreacted, use pinionWheel instead, with number of pinion teeth set to zero!");

	large_dedendum_radius=large_gear_circular_pitch*(large_gear_teeth-2)/360-gear_clearance;
	//small_dedendum_radius=small_gear_circular_pitch*(small_gear_teeth-2)/360-gear_clearance;
	
	large_addendum_radius=large_gear_circular_pitch*(large_gear_teeth+2)/360-gear_clearance;
	//small_addendum_radius=small_gear_circular_pitch*(small_gear_teeth+2)/360-gear_clearance;
	
	bore_radius=pin_radius+sleeve_level*sleeve_thickness+loose_fit;
	sleeve_radius=pin_radius+(sleeve_level+1)*sleeve_thickness;

	//small_gear_color = [0.88, 0.78, 0.5];
	structure_color = [0.45, 0.43, 0.5];
	large_gear_color = [0.2, 0.2, 0.2];

	if (negative_space==false)
	{
		union()
		{
			color(large_gear_color)
			translate([0,0,gear_thickness/2])
			gear (circular_pitch=large_gear_circular_pitch, 
				gear_thickness = 0, 
				rim_thickness = gear_thickness/2-gear_spacer,
				rim_width = rim_width,
				hub_thickness = gear_thickness/2-gear_spacer, 
				hub_diameter=large_dedendum_radius*2,
				bore_diameter=(large_dedendum_radius-rim_width)*2, 
				circles=0,
				pressure_angle=pressure_angle,
				number_of_teeth=large_gear_teeth,
				clearance=gear_clearance,
				backlash=gear_backlash,
				twist=twist_factor*180/large_gear_teeth);

			color(large_gear_color)
			translate([0,0,gear_thickness/2])
			mirror([0,0,1])
			gear (circular_pitch=large_gear_circular_pitch, 
				gear_thickness = 0, 
				rim_thickness = gear_thickness/2,
				rim_width = rim_width,
				hub_thickness = gear_thickness/2, 
				hub_diameter=large_dedendum_radius*2,
				bore_diameter=(large_dedendum_radius-rim_width)*2, 
				circles=0,
				pressure_angle=pressure_angle,
				number_of_teeth=large_gear_teeth,
				clearance=gear_clearance,
				backlash=gear_backlash,
				twist=twist_factor*180/large_gear_teeth);

			color(structure_color)
			translate([0,0,gear_thickness-gear_spacer])
			drum(
				radius=large_dedendum_radius,
				rimWidth=rim_width,
				drumHeight=drum_height+gear_spacer,
				numberHoles=number_holes,
				holeRadius=min(hole_radius,(drum_height+gear_spacer)/6),
				holeRotate=notch_angle+180/number_holes);

			color(structure_color)
			spokes(number_spokes,large_dedendum_radius-rim_width,drum_height+gear_thickness,spoke_width,bore_radius,notch_angle);
	
			color(structure_color)
			ring(sleeve_radius,bore_radius,gear_thickness+drum_height+sleeve_extension);
		}
	}

	if (negative_space==true)
	{
		color(structure_color)
		translate([0,0,-space])
		union()
		{
			ring(large_addendum_radius+space,0,gear_thickness+2*space);

			ring(large_dedendum_radius+space,0,thickness+drum_height+2*space);

			ring(sleeve_radius+space,0,drum_height+sleeve_extension+2*space);
		}
	}
}

module ratchetArm(
	height=4, 
	width=4,
	length=23,
	headLength=12,
	angle=45,
	distance=21,
	clockwise=true) 
{ 
	circleRadius=10;

	translate([distance+width,0,0])
	rotate([0,0,angle])
	difference() 
	{
		union()
		{
		cube([headLength,width,height]);

		cube([length,width/2,height]);
		}

		translate([headLength,circleRadius+width/2,height/2])
		cylinder(r=circleRadius, h=height+1, center=true);
	}
}

module chirality(clockwise=true)
{
	if (clockwise==true) children(0);
	if (clockwise!=true) mirror([0,0,1]) rotate(180,[1,0,0]) children(0);
}

module ratchetGear(
	drum_height,
	clockwise=true,
	large_gear_teeth,
	large_gear_circular_pitch,
	gear_clearance=0.2,
	gear_backlash=0.1,
	gear_spacer=0.5,
	pressure_angle=14.5,
	twist_factor=0,
	rim_width,
	sleeve_level=0,
	pin_radius,
	sleeve_thickness,
	loose_fit=0.5,
	gear_thickness,
	sleeve_extension,
	spacer,
	number_spokes,
	spoke_width,
	notch_angle=0,
	negative_space=false,
	space=0.1)
{
	large_dedendum_radius=large_gear_circular_pitch*(large_gear_teeth-2)/360-gear_clearance;
	//small_dedendum_radius=small_gear_circular_pitch*(small_gear_teeth-2)/360-gear_clearance;
	
	large_addendum_radius=large_gear_circular_pitch*(large_gear_teeth+2)/360-gear_clearance;
	//small_addendum_radius=small_gear_circular_pitch*(small_gear_teeth+2)/360-gear_clearance;
	
	bore_radius=pin_radius+sleeve_level*sleeve_thickness+loose_fit;
	sleeve_radius=pin_radius+(sleeve_level+1)*sleeve_thickness;

	small_gear_color = [0.88, 0.78, 0.5];
	structure_color = [0.45, 0.43, 0.5];
	large_gear_color = [0.2, 0.2, 0.2];

	if (negative_space==false)
	{
		union()
		{
			color(large_gear_color)
			translate([0,0,gear_thickness/2])
			gear (circular_pitch=large_gear_circular_pitch, 
				gear_thickness = 0, 
				rim_thickness = gear_thickness/2-gear_spacer,
				rim_width = rim_width,
				hub_thickness = gear_thickness/2-gear_spacer, 
				hub_diameter=large_dedendum_radius*2,
				bore_diameter=(large_dedendum_radius-rim_width)*2, 
				circles=0,
				pressure_angle=pressure_angle,
				number_of_teeth=large_gear_teeth,
				clearance=gear_clearance,
				backlash=gear_backlash,
				twist=twist_factor*180/large_gear_teeth);

			color(large_gear_color)
			translate([0,0,gear_thickness/2])
			mirror([0,0,1])
			gear (circular_pitch=large_gear_circular_pitch, 
				gear_thickness = 0, 
				rim_thickness = gear_thickness/2,
				rim_width = rim_width,
				hub_thickness = gear_thickness/2, 
				hub_diameter=large_dedendum_radius*2,
				bore_diameter=(large_dedendum_radius-rim_width)*2, 
				circles=0,
				pressure_angle=pressure_angle,
				number_of_teeth=large_gear_teeth,
				clearance=gear_clearance,
				backlash=gear_backlash,
				twist=twist_factor*180/large_gear_teeth);

			color(structure_color)
			spokes(number_spokes,large_dedendum_radius-rim_width,gear_thickness,spoke_width,bore_radius,notch_angle);

			color(structure_color)
			ring(large_dedendum_radius,large_dedendum_radius-rim_width,gear_thickness);

			color(structure_color)
			ring(0.6*large_dedendum_radius,bore_radius,gear_thickness+spacer);

			color(small_gear_color)
			rotate(ratchetAdjust,[0,0,1])
			chirality(clockwise)
			ringTooth(
				outerRadius=0.5*large_dedendum_radius,
				innerRadius=0.4*large_dedendum_radius,
				thickness=2*gear_thickness+spacer,
				numberTeeth=2*number_spokes,
				toothLength=0.2*large_dedendum_radius)

			tooth(
				toothLength=0.3*large_dedendum_radius,
				thickness=2*gear_thickness+spacer,
				toothLean=-50,
				toothSharpness=-50,
				clubSize=0,
				clubAngle=0);

			color(structure_color)
			ring(sleeve_radius,bore_radius,gear_thickness+0*drum_height+sleeve_extension);
		}
	}

	if (negative_space==true)
	{
		color(structure_color)
		translate([0,0,-space])
		union()
		{
			ring(large_addendum_radius+space,0,2*gear_thickness+2*space);

			ring(sleeve_radius+space,0,drum_height+sleeve_extension+2*space);
		}
	}
}

module ratchetDrum(
	drum_height,
	clockwise=true,
	large_gear_teeth,
	large_gear_circular_pitch,
	small_gear_teeth=0,
	small_gear_circular_pitch=0,
	gear_clearance=0.2,
	gear_backlash=0.1,
	gear_spacer=0.5,
	pressure_angle=14.5,
	twist_factor=0,
	rim_width,
	sleeve_level=0,
	pin_radius,
	sleeve_thickness,
	loose_fit=0.5,
	gear_thickness,
	sleeve_extension,
	spacer,
	number_spokes,
	spoke_width,
	number_holes=0,
	hole_radius=0,
	notch_angle=0,
	negative_space=false,
	space=0.1)
{
	large_dedendum_radius=large_gear_circular_pitch*(large_gear_teeth-2)/360-gear_clearance;
	small_dedendum_radius=small_gear_circular_pitch*(small_gear_teeth-2)/360-gear_clearance;
	
	large_addendum_radius=large_gear_circular_pitch*(large_gear_teeth+2)/360-gear_clearance;
	small_addendum_radius=small_gear_circular_pitch*(small_gear_teeth+2)/360-gear_clearance;
	
	bore_radius=pin_radius+sleeve_level*sleeve_thickness+loose_fit;
	sleeve_radius=pin_radius+(sleeve_level+2)*sleeve_thickness;//1)*sleeve_thickness;

	small_gear_color = [0.88, 0.78, 0.5];
	structure_color = [0.45, 0.43, 0.5];
	large_gear_color = [0.2, 0.2, 0.2];

	if (negative_space==false)
	{
		union()
		{
			if (small_gear_teeth!=0)
			{
				//color(structure_color)
				//ring(small_addendum_radius,bore_radius,gear_thickness-gear_spacer+spacer);

				color(small_gear_color)
				translate([0,0,gear_thickness*0.5+drum_height])
				gear (circular_pitch=small_gear_circular_pitch, 
					gear_thickness = 0, 
					rim_thickness = gear_thickness/2,
					rim_width = rim_width,
					hub_thickness = gear_thickness/2, 
					hub_diameter=small_dedendum_radius*2,
					bore_diameter=bore_radius*2,  
					circles=0,
					pressure_angle=pressure_angle,
					number_of_teeth=small_gear_teeth,
					clearance=gear_clearance,
					backlash=gear_backlash,
					twist=-twist_factor*180/small_gear_teeth);

				color(small_gear_color)
				translate([0,0,gear_thickness*0.5+drum_height])
				mirror([0,0,1])
				gear (circular_pitch=small_gear_circular_pitch, 
					gear_thickness = 0, 
					rim_thickness = gear_thickness/2+gear_spacer,
					rim_width = rim_width,
					hub_thickness = gear_thickness/2+gear_spacer, 
					hub_diameter=small_dedendum_radius*2,
					bore_diameter=bore_radius*2,  
					circles=0,
					pressure_angle=pressure_angle,
					number_of_teeth=small_gear_teeth,
					clearance=gear_clearance,
					backlash=gear_backlash,
					twist=-twist_factor*180/small_gear_teeth);
			}

			color(structure_color)
			difference()
			{
				union()
				{
					spokes(number_spokes,large_dedendum_radius-rim_width,drum_height,spoke_width,bore_radius,notch_angle);
					ring(small_addendum_radius,bore_radius,drum_height);

					ring(sleeve_radius,bore_radius,drum_height+gear_thickness+sleeve_extension);
				}

				rotate_extrude()
				translate([0.5*large_dedendum_radius,0,0])
				rotate([0,0,45])
				square(size=0.4*large_dedendum_radius, center=true);
			}

			color(large_gear_color)
			drum(
				radius=large_dedendum_radius,
				rimWidth=rim_width,
				drumHeight=drum_height,
				numberHoles=number_holes,
				holeRadius=min(hole_radius,(drum_height+gear_spacer)/6),
				holeRotate=notch_angle+180/number_holes);

			color(large_gear_color)
			chirality(clockwise)
			rotate(ratchetAdjust,[0,0,1])
			for (i=[0:number_spokes-1])
			{
				rotate(i*360/number_spokes,[0,0,1])
				ratchetArm(
					height=gear_thickness, 
					width=0.1*large_dedendum_radius,
					 length=0.71*large_dedendum_radius,
					headLength=large_dedendum_radius/3,
					angle=90,
					distance=0.5*large_dedendum_radius);
			}
		}
	}

	if (negative_space==true)
	{
		color(structure_color)
		translate([0,0,-space])
		union()
		{
			ring(large_addendum_radius+space,0,drum_height+2*space);

			ring(sleeve_radius+space,0,drum_height+sleeve_extension+2*space);
		}
	}
}
